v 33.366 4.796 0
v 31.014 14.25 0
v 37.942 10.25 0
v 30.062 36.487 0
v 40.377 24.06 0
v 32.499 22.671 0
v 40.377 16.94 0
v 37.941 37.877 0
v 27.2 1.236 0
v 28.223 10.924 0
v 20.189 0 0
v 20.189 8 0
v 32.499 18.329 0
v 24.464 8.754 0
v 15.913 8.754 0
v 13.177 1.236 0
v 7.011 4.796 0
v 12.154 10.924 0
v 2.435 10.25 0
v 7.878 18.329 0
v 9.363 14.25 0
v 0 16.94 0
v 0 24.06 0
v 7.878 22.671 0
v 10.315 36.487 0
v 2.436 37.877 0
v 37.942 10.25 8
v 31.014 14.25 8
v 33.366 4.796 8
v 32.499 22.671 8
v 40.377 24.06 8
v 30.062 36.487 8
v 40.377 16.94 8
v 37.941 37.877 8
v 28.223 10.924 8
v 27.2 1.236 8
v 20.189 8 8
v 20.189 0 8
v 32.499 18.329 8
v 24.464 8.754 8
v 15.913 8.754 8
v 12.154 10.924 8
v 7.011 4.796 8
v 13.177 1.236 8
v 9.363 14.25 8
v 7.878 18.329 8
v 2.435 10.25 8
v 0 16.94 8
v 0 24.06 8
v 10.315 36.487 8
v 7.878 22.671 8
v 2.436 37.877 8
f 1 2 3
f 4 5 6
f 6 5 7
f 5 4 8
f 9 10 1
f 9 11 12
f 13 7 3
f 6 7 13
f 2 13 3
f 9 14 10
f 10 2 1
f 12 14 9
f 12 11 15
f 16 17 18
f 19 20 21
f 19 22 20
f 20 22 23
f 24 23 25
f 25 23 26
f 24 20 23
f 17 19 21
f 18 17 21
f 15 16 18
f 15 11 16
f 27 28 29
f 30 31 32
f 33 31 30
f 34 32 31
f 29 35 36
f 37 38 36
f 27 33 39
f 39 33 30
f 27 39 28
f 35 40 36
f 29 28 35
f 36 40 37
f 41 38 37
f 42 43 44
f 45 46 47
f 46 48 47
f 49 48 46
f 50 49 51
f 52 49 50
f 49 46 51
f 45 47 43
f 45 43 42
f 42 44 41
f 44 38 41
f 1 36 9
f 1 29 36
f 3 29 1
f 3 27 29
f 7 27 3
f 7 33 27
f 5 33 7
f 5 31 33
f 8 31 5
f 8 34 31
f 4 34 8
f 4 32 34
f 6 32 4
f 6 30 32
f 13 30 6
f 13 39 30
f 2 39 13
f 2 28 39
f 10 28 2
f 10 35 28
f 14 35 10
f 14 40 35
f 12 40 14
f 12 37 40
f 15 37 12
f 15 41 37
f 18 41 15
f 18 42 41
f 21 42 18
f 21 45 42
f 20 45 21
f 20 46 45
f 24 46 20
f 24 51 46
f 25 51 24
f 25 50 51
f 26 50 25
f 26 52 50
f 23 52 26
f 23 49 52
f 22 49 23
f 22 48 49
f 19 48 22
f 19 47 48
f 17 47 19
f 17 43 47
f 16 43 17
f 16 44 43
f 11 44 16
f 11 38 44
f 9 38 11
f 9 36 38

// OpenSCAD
$fn = 32;

// ----------------------------------------------------------------------
// Clip blank: omega clip, 8 mm thick
// ----------------------------------------------------------------------

// --- parameters (mm) ---
profile_height = 8;       // extrusion height
profile_points = 26;      // points of the closed outline

profile = [[0, 24.06], [0, 16.94], [2.435, 10.25], [7.011, 4.796], [13.177, 1.236], [20.189, 0], [27.2, 1.236], [33.366, 4.796], [37.942, 10.25], [40.377, 16.94], [40.377, 24.06], [37.941, 37.877], [30.062, 36.487], [32.499, 22.671], [32.499, 18.329], [31.014, 14.25], [28.223, 10.924], [24.464, 8.754], [20.189, 8], [15.913, 8.754], [12.154, 10.924], [9.363, 14.25], [7.878, 18.329], [7.878, 22.671], [10.315, 36.487], [2.436, 37.877]];  // single closed polygon, 26 points, counter clockwise

// --- the one profile operation ---
linear_extrude(height = profile_height) polygon(points = profile);
